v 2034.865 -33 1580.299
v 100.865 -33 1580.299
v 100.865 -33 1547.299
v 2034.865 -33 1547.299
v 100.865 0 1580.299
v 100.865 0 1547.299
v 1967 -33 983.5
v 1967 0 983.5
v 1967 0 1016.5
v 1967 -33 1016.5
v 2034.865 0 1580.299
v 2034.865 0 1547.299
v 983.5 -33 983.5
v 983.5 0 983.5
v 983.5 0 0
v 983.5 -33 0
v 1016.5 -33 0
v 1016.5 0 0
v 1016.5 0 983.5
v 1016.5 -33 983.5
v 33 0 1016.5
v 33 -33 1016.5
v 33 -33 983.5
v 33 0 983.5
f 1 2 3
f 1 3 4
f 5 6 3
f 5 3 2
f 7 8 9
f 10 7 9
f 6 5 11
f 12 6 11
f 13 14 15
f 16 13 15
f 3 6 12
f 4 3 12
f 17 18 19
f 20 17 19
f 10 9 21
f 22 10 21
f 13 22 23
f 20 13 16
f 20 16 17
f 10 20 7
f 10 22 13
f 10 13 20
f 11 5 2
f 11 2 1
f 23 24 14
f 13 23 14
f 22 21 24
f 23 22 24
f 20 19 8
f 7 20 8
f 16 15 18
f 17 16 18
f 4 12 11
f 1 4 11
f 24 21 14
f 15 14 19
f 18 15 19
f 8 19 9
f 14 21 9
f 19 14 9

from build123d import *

# Parameters (mm, degrees)
F1_DEPTH = 33
F0_W     = 1934
F0_H     = 33


# Not quite as in the source:
# - a feature names something its author has since deleted; it is built from what else it names


with BuildPart() as f1:
    # F0 (on Front) → F1 (new body)
    with BuildSketch(Plane.XZ):
        Polygon((983.5, 983.5), (983.5, 0), (1016.5, 0), (1016.5, 983.5), (1967, 983.5), (1967, 1016.5), (33, 1016.5), (33, 983.5), align=None)
    extrude(amount=F1_DEPTH)


with BuildPart() as f1b:
    # F0 (on Front) → F1, piece 2 (new body)
    with BuildSketch(Plane.XZ):
        with Locations((1067.8651331067, 1563.7987890244)):
            Rectangle(F0_W, F0_H)
    extrude(amount=F1_DEPTH)


solid = Compound([f1.part, f1b.part])
